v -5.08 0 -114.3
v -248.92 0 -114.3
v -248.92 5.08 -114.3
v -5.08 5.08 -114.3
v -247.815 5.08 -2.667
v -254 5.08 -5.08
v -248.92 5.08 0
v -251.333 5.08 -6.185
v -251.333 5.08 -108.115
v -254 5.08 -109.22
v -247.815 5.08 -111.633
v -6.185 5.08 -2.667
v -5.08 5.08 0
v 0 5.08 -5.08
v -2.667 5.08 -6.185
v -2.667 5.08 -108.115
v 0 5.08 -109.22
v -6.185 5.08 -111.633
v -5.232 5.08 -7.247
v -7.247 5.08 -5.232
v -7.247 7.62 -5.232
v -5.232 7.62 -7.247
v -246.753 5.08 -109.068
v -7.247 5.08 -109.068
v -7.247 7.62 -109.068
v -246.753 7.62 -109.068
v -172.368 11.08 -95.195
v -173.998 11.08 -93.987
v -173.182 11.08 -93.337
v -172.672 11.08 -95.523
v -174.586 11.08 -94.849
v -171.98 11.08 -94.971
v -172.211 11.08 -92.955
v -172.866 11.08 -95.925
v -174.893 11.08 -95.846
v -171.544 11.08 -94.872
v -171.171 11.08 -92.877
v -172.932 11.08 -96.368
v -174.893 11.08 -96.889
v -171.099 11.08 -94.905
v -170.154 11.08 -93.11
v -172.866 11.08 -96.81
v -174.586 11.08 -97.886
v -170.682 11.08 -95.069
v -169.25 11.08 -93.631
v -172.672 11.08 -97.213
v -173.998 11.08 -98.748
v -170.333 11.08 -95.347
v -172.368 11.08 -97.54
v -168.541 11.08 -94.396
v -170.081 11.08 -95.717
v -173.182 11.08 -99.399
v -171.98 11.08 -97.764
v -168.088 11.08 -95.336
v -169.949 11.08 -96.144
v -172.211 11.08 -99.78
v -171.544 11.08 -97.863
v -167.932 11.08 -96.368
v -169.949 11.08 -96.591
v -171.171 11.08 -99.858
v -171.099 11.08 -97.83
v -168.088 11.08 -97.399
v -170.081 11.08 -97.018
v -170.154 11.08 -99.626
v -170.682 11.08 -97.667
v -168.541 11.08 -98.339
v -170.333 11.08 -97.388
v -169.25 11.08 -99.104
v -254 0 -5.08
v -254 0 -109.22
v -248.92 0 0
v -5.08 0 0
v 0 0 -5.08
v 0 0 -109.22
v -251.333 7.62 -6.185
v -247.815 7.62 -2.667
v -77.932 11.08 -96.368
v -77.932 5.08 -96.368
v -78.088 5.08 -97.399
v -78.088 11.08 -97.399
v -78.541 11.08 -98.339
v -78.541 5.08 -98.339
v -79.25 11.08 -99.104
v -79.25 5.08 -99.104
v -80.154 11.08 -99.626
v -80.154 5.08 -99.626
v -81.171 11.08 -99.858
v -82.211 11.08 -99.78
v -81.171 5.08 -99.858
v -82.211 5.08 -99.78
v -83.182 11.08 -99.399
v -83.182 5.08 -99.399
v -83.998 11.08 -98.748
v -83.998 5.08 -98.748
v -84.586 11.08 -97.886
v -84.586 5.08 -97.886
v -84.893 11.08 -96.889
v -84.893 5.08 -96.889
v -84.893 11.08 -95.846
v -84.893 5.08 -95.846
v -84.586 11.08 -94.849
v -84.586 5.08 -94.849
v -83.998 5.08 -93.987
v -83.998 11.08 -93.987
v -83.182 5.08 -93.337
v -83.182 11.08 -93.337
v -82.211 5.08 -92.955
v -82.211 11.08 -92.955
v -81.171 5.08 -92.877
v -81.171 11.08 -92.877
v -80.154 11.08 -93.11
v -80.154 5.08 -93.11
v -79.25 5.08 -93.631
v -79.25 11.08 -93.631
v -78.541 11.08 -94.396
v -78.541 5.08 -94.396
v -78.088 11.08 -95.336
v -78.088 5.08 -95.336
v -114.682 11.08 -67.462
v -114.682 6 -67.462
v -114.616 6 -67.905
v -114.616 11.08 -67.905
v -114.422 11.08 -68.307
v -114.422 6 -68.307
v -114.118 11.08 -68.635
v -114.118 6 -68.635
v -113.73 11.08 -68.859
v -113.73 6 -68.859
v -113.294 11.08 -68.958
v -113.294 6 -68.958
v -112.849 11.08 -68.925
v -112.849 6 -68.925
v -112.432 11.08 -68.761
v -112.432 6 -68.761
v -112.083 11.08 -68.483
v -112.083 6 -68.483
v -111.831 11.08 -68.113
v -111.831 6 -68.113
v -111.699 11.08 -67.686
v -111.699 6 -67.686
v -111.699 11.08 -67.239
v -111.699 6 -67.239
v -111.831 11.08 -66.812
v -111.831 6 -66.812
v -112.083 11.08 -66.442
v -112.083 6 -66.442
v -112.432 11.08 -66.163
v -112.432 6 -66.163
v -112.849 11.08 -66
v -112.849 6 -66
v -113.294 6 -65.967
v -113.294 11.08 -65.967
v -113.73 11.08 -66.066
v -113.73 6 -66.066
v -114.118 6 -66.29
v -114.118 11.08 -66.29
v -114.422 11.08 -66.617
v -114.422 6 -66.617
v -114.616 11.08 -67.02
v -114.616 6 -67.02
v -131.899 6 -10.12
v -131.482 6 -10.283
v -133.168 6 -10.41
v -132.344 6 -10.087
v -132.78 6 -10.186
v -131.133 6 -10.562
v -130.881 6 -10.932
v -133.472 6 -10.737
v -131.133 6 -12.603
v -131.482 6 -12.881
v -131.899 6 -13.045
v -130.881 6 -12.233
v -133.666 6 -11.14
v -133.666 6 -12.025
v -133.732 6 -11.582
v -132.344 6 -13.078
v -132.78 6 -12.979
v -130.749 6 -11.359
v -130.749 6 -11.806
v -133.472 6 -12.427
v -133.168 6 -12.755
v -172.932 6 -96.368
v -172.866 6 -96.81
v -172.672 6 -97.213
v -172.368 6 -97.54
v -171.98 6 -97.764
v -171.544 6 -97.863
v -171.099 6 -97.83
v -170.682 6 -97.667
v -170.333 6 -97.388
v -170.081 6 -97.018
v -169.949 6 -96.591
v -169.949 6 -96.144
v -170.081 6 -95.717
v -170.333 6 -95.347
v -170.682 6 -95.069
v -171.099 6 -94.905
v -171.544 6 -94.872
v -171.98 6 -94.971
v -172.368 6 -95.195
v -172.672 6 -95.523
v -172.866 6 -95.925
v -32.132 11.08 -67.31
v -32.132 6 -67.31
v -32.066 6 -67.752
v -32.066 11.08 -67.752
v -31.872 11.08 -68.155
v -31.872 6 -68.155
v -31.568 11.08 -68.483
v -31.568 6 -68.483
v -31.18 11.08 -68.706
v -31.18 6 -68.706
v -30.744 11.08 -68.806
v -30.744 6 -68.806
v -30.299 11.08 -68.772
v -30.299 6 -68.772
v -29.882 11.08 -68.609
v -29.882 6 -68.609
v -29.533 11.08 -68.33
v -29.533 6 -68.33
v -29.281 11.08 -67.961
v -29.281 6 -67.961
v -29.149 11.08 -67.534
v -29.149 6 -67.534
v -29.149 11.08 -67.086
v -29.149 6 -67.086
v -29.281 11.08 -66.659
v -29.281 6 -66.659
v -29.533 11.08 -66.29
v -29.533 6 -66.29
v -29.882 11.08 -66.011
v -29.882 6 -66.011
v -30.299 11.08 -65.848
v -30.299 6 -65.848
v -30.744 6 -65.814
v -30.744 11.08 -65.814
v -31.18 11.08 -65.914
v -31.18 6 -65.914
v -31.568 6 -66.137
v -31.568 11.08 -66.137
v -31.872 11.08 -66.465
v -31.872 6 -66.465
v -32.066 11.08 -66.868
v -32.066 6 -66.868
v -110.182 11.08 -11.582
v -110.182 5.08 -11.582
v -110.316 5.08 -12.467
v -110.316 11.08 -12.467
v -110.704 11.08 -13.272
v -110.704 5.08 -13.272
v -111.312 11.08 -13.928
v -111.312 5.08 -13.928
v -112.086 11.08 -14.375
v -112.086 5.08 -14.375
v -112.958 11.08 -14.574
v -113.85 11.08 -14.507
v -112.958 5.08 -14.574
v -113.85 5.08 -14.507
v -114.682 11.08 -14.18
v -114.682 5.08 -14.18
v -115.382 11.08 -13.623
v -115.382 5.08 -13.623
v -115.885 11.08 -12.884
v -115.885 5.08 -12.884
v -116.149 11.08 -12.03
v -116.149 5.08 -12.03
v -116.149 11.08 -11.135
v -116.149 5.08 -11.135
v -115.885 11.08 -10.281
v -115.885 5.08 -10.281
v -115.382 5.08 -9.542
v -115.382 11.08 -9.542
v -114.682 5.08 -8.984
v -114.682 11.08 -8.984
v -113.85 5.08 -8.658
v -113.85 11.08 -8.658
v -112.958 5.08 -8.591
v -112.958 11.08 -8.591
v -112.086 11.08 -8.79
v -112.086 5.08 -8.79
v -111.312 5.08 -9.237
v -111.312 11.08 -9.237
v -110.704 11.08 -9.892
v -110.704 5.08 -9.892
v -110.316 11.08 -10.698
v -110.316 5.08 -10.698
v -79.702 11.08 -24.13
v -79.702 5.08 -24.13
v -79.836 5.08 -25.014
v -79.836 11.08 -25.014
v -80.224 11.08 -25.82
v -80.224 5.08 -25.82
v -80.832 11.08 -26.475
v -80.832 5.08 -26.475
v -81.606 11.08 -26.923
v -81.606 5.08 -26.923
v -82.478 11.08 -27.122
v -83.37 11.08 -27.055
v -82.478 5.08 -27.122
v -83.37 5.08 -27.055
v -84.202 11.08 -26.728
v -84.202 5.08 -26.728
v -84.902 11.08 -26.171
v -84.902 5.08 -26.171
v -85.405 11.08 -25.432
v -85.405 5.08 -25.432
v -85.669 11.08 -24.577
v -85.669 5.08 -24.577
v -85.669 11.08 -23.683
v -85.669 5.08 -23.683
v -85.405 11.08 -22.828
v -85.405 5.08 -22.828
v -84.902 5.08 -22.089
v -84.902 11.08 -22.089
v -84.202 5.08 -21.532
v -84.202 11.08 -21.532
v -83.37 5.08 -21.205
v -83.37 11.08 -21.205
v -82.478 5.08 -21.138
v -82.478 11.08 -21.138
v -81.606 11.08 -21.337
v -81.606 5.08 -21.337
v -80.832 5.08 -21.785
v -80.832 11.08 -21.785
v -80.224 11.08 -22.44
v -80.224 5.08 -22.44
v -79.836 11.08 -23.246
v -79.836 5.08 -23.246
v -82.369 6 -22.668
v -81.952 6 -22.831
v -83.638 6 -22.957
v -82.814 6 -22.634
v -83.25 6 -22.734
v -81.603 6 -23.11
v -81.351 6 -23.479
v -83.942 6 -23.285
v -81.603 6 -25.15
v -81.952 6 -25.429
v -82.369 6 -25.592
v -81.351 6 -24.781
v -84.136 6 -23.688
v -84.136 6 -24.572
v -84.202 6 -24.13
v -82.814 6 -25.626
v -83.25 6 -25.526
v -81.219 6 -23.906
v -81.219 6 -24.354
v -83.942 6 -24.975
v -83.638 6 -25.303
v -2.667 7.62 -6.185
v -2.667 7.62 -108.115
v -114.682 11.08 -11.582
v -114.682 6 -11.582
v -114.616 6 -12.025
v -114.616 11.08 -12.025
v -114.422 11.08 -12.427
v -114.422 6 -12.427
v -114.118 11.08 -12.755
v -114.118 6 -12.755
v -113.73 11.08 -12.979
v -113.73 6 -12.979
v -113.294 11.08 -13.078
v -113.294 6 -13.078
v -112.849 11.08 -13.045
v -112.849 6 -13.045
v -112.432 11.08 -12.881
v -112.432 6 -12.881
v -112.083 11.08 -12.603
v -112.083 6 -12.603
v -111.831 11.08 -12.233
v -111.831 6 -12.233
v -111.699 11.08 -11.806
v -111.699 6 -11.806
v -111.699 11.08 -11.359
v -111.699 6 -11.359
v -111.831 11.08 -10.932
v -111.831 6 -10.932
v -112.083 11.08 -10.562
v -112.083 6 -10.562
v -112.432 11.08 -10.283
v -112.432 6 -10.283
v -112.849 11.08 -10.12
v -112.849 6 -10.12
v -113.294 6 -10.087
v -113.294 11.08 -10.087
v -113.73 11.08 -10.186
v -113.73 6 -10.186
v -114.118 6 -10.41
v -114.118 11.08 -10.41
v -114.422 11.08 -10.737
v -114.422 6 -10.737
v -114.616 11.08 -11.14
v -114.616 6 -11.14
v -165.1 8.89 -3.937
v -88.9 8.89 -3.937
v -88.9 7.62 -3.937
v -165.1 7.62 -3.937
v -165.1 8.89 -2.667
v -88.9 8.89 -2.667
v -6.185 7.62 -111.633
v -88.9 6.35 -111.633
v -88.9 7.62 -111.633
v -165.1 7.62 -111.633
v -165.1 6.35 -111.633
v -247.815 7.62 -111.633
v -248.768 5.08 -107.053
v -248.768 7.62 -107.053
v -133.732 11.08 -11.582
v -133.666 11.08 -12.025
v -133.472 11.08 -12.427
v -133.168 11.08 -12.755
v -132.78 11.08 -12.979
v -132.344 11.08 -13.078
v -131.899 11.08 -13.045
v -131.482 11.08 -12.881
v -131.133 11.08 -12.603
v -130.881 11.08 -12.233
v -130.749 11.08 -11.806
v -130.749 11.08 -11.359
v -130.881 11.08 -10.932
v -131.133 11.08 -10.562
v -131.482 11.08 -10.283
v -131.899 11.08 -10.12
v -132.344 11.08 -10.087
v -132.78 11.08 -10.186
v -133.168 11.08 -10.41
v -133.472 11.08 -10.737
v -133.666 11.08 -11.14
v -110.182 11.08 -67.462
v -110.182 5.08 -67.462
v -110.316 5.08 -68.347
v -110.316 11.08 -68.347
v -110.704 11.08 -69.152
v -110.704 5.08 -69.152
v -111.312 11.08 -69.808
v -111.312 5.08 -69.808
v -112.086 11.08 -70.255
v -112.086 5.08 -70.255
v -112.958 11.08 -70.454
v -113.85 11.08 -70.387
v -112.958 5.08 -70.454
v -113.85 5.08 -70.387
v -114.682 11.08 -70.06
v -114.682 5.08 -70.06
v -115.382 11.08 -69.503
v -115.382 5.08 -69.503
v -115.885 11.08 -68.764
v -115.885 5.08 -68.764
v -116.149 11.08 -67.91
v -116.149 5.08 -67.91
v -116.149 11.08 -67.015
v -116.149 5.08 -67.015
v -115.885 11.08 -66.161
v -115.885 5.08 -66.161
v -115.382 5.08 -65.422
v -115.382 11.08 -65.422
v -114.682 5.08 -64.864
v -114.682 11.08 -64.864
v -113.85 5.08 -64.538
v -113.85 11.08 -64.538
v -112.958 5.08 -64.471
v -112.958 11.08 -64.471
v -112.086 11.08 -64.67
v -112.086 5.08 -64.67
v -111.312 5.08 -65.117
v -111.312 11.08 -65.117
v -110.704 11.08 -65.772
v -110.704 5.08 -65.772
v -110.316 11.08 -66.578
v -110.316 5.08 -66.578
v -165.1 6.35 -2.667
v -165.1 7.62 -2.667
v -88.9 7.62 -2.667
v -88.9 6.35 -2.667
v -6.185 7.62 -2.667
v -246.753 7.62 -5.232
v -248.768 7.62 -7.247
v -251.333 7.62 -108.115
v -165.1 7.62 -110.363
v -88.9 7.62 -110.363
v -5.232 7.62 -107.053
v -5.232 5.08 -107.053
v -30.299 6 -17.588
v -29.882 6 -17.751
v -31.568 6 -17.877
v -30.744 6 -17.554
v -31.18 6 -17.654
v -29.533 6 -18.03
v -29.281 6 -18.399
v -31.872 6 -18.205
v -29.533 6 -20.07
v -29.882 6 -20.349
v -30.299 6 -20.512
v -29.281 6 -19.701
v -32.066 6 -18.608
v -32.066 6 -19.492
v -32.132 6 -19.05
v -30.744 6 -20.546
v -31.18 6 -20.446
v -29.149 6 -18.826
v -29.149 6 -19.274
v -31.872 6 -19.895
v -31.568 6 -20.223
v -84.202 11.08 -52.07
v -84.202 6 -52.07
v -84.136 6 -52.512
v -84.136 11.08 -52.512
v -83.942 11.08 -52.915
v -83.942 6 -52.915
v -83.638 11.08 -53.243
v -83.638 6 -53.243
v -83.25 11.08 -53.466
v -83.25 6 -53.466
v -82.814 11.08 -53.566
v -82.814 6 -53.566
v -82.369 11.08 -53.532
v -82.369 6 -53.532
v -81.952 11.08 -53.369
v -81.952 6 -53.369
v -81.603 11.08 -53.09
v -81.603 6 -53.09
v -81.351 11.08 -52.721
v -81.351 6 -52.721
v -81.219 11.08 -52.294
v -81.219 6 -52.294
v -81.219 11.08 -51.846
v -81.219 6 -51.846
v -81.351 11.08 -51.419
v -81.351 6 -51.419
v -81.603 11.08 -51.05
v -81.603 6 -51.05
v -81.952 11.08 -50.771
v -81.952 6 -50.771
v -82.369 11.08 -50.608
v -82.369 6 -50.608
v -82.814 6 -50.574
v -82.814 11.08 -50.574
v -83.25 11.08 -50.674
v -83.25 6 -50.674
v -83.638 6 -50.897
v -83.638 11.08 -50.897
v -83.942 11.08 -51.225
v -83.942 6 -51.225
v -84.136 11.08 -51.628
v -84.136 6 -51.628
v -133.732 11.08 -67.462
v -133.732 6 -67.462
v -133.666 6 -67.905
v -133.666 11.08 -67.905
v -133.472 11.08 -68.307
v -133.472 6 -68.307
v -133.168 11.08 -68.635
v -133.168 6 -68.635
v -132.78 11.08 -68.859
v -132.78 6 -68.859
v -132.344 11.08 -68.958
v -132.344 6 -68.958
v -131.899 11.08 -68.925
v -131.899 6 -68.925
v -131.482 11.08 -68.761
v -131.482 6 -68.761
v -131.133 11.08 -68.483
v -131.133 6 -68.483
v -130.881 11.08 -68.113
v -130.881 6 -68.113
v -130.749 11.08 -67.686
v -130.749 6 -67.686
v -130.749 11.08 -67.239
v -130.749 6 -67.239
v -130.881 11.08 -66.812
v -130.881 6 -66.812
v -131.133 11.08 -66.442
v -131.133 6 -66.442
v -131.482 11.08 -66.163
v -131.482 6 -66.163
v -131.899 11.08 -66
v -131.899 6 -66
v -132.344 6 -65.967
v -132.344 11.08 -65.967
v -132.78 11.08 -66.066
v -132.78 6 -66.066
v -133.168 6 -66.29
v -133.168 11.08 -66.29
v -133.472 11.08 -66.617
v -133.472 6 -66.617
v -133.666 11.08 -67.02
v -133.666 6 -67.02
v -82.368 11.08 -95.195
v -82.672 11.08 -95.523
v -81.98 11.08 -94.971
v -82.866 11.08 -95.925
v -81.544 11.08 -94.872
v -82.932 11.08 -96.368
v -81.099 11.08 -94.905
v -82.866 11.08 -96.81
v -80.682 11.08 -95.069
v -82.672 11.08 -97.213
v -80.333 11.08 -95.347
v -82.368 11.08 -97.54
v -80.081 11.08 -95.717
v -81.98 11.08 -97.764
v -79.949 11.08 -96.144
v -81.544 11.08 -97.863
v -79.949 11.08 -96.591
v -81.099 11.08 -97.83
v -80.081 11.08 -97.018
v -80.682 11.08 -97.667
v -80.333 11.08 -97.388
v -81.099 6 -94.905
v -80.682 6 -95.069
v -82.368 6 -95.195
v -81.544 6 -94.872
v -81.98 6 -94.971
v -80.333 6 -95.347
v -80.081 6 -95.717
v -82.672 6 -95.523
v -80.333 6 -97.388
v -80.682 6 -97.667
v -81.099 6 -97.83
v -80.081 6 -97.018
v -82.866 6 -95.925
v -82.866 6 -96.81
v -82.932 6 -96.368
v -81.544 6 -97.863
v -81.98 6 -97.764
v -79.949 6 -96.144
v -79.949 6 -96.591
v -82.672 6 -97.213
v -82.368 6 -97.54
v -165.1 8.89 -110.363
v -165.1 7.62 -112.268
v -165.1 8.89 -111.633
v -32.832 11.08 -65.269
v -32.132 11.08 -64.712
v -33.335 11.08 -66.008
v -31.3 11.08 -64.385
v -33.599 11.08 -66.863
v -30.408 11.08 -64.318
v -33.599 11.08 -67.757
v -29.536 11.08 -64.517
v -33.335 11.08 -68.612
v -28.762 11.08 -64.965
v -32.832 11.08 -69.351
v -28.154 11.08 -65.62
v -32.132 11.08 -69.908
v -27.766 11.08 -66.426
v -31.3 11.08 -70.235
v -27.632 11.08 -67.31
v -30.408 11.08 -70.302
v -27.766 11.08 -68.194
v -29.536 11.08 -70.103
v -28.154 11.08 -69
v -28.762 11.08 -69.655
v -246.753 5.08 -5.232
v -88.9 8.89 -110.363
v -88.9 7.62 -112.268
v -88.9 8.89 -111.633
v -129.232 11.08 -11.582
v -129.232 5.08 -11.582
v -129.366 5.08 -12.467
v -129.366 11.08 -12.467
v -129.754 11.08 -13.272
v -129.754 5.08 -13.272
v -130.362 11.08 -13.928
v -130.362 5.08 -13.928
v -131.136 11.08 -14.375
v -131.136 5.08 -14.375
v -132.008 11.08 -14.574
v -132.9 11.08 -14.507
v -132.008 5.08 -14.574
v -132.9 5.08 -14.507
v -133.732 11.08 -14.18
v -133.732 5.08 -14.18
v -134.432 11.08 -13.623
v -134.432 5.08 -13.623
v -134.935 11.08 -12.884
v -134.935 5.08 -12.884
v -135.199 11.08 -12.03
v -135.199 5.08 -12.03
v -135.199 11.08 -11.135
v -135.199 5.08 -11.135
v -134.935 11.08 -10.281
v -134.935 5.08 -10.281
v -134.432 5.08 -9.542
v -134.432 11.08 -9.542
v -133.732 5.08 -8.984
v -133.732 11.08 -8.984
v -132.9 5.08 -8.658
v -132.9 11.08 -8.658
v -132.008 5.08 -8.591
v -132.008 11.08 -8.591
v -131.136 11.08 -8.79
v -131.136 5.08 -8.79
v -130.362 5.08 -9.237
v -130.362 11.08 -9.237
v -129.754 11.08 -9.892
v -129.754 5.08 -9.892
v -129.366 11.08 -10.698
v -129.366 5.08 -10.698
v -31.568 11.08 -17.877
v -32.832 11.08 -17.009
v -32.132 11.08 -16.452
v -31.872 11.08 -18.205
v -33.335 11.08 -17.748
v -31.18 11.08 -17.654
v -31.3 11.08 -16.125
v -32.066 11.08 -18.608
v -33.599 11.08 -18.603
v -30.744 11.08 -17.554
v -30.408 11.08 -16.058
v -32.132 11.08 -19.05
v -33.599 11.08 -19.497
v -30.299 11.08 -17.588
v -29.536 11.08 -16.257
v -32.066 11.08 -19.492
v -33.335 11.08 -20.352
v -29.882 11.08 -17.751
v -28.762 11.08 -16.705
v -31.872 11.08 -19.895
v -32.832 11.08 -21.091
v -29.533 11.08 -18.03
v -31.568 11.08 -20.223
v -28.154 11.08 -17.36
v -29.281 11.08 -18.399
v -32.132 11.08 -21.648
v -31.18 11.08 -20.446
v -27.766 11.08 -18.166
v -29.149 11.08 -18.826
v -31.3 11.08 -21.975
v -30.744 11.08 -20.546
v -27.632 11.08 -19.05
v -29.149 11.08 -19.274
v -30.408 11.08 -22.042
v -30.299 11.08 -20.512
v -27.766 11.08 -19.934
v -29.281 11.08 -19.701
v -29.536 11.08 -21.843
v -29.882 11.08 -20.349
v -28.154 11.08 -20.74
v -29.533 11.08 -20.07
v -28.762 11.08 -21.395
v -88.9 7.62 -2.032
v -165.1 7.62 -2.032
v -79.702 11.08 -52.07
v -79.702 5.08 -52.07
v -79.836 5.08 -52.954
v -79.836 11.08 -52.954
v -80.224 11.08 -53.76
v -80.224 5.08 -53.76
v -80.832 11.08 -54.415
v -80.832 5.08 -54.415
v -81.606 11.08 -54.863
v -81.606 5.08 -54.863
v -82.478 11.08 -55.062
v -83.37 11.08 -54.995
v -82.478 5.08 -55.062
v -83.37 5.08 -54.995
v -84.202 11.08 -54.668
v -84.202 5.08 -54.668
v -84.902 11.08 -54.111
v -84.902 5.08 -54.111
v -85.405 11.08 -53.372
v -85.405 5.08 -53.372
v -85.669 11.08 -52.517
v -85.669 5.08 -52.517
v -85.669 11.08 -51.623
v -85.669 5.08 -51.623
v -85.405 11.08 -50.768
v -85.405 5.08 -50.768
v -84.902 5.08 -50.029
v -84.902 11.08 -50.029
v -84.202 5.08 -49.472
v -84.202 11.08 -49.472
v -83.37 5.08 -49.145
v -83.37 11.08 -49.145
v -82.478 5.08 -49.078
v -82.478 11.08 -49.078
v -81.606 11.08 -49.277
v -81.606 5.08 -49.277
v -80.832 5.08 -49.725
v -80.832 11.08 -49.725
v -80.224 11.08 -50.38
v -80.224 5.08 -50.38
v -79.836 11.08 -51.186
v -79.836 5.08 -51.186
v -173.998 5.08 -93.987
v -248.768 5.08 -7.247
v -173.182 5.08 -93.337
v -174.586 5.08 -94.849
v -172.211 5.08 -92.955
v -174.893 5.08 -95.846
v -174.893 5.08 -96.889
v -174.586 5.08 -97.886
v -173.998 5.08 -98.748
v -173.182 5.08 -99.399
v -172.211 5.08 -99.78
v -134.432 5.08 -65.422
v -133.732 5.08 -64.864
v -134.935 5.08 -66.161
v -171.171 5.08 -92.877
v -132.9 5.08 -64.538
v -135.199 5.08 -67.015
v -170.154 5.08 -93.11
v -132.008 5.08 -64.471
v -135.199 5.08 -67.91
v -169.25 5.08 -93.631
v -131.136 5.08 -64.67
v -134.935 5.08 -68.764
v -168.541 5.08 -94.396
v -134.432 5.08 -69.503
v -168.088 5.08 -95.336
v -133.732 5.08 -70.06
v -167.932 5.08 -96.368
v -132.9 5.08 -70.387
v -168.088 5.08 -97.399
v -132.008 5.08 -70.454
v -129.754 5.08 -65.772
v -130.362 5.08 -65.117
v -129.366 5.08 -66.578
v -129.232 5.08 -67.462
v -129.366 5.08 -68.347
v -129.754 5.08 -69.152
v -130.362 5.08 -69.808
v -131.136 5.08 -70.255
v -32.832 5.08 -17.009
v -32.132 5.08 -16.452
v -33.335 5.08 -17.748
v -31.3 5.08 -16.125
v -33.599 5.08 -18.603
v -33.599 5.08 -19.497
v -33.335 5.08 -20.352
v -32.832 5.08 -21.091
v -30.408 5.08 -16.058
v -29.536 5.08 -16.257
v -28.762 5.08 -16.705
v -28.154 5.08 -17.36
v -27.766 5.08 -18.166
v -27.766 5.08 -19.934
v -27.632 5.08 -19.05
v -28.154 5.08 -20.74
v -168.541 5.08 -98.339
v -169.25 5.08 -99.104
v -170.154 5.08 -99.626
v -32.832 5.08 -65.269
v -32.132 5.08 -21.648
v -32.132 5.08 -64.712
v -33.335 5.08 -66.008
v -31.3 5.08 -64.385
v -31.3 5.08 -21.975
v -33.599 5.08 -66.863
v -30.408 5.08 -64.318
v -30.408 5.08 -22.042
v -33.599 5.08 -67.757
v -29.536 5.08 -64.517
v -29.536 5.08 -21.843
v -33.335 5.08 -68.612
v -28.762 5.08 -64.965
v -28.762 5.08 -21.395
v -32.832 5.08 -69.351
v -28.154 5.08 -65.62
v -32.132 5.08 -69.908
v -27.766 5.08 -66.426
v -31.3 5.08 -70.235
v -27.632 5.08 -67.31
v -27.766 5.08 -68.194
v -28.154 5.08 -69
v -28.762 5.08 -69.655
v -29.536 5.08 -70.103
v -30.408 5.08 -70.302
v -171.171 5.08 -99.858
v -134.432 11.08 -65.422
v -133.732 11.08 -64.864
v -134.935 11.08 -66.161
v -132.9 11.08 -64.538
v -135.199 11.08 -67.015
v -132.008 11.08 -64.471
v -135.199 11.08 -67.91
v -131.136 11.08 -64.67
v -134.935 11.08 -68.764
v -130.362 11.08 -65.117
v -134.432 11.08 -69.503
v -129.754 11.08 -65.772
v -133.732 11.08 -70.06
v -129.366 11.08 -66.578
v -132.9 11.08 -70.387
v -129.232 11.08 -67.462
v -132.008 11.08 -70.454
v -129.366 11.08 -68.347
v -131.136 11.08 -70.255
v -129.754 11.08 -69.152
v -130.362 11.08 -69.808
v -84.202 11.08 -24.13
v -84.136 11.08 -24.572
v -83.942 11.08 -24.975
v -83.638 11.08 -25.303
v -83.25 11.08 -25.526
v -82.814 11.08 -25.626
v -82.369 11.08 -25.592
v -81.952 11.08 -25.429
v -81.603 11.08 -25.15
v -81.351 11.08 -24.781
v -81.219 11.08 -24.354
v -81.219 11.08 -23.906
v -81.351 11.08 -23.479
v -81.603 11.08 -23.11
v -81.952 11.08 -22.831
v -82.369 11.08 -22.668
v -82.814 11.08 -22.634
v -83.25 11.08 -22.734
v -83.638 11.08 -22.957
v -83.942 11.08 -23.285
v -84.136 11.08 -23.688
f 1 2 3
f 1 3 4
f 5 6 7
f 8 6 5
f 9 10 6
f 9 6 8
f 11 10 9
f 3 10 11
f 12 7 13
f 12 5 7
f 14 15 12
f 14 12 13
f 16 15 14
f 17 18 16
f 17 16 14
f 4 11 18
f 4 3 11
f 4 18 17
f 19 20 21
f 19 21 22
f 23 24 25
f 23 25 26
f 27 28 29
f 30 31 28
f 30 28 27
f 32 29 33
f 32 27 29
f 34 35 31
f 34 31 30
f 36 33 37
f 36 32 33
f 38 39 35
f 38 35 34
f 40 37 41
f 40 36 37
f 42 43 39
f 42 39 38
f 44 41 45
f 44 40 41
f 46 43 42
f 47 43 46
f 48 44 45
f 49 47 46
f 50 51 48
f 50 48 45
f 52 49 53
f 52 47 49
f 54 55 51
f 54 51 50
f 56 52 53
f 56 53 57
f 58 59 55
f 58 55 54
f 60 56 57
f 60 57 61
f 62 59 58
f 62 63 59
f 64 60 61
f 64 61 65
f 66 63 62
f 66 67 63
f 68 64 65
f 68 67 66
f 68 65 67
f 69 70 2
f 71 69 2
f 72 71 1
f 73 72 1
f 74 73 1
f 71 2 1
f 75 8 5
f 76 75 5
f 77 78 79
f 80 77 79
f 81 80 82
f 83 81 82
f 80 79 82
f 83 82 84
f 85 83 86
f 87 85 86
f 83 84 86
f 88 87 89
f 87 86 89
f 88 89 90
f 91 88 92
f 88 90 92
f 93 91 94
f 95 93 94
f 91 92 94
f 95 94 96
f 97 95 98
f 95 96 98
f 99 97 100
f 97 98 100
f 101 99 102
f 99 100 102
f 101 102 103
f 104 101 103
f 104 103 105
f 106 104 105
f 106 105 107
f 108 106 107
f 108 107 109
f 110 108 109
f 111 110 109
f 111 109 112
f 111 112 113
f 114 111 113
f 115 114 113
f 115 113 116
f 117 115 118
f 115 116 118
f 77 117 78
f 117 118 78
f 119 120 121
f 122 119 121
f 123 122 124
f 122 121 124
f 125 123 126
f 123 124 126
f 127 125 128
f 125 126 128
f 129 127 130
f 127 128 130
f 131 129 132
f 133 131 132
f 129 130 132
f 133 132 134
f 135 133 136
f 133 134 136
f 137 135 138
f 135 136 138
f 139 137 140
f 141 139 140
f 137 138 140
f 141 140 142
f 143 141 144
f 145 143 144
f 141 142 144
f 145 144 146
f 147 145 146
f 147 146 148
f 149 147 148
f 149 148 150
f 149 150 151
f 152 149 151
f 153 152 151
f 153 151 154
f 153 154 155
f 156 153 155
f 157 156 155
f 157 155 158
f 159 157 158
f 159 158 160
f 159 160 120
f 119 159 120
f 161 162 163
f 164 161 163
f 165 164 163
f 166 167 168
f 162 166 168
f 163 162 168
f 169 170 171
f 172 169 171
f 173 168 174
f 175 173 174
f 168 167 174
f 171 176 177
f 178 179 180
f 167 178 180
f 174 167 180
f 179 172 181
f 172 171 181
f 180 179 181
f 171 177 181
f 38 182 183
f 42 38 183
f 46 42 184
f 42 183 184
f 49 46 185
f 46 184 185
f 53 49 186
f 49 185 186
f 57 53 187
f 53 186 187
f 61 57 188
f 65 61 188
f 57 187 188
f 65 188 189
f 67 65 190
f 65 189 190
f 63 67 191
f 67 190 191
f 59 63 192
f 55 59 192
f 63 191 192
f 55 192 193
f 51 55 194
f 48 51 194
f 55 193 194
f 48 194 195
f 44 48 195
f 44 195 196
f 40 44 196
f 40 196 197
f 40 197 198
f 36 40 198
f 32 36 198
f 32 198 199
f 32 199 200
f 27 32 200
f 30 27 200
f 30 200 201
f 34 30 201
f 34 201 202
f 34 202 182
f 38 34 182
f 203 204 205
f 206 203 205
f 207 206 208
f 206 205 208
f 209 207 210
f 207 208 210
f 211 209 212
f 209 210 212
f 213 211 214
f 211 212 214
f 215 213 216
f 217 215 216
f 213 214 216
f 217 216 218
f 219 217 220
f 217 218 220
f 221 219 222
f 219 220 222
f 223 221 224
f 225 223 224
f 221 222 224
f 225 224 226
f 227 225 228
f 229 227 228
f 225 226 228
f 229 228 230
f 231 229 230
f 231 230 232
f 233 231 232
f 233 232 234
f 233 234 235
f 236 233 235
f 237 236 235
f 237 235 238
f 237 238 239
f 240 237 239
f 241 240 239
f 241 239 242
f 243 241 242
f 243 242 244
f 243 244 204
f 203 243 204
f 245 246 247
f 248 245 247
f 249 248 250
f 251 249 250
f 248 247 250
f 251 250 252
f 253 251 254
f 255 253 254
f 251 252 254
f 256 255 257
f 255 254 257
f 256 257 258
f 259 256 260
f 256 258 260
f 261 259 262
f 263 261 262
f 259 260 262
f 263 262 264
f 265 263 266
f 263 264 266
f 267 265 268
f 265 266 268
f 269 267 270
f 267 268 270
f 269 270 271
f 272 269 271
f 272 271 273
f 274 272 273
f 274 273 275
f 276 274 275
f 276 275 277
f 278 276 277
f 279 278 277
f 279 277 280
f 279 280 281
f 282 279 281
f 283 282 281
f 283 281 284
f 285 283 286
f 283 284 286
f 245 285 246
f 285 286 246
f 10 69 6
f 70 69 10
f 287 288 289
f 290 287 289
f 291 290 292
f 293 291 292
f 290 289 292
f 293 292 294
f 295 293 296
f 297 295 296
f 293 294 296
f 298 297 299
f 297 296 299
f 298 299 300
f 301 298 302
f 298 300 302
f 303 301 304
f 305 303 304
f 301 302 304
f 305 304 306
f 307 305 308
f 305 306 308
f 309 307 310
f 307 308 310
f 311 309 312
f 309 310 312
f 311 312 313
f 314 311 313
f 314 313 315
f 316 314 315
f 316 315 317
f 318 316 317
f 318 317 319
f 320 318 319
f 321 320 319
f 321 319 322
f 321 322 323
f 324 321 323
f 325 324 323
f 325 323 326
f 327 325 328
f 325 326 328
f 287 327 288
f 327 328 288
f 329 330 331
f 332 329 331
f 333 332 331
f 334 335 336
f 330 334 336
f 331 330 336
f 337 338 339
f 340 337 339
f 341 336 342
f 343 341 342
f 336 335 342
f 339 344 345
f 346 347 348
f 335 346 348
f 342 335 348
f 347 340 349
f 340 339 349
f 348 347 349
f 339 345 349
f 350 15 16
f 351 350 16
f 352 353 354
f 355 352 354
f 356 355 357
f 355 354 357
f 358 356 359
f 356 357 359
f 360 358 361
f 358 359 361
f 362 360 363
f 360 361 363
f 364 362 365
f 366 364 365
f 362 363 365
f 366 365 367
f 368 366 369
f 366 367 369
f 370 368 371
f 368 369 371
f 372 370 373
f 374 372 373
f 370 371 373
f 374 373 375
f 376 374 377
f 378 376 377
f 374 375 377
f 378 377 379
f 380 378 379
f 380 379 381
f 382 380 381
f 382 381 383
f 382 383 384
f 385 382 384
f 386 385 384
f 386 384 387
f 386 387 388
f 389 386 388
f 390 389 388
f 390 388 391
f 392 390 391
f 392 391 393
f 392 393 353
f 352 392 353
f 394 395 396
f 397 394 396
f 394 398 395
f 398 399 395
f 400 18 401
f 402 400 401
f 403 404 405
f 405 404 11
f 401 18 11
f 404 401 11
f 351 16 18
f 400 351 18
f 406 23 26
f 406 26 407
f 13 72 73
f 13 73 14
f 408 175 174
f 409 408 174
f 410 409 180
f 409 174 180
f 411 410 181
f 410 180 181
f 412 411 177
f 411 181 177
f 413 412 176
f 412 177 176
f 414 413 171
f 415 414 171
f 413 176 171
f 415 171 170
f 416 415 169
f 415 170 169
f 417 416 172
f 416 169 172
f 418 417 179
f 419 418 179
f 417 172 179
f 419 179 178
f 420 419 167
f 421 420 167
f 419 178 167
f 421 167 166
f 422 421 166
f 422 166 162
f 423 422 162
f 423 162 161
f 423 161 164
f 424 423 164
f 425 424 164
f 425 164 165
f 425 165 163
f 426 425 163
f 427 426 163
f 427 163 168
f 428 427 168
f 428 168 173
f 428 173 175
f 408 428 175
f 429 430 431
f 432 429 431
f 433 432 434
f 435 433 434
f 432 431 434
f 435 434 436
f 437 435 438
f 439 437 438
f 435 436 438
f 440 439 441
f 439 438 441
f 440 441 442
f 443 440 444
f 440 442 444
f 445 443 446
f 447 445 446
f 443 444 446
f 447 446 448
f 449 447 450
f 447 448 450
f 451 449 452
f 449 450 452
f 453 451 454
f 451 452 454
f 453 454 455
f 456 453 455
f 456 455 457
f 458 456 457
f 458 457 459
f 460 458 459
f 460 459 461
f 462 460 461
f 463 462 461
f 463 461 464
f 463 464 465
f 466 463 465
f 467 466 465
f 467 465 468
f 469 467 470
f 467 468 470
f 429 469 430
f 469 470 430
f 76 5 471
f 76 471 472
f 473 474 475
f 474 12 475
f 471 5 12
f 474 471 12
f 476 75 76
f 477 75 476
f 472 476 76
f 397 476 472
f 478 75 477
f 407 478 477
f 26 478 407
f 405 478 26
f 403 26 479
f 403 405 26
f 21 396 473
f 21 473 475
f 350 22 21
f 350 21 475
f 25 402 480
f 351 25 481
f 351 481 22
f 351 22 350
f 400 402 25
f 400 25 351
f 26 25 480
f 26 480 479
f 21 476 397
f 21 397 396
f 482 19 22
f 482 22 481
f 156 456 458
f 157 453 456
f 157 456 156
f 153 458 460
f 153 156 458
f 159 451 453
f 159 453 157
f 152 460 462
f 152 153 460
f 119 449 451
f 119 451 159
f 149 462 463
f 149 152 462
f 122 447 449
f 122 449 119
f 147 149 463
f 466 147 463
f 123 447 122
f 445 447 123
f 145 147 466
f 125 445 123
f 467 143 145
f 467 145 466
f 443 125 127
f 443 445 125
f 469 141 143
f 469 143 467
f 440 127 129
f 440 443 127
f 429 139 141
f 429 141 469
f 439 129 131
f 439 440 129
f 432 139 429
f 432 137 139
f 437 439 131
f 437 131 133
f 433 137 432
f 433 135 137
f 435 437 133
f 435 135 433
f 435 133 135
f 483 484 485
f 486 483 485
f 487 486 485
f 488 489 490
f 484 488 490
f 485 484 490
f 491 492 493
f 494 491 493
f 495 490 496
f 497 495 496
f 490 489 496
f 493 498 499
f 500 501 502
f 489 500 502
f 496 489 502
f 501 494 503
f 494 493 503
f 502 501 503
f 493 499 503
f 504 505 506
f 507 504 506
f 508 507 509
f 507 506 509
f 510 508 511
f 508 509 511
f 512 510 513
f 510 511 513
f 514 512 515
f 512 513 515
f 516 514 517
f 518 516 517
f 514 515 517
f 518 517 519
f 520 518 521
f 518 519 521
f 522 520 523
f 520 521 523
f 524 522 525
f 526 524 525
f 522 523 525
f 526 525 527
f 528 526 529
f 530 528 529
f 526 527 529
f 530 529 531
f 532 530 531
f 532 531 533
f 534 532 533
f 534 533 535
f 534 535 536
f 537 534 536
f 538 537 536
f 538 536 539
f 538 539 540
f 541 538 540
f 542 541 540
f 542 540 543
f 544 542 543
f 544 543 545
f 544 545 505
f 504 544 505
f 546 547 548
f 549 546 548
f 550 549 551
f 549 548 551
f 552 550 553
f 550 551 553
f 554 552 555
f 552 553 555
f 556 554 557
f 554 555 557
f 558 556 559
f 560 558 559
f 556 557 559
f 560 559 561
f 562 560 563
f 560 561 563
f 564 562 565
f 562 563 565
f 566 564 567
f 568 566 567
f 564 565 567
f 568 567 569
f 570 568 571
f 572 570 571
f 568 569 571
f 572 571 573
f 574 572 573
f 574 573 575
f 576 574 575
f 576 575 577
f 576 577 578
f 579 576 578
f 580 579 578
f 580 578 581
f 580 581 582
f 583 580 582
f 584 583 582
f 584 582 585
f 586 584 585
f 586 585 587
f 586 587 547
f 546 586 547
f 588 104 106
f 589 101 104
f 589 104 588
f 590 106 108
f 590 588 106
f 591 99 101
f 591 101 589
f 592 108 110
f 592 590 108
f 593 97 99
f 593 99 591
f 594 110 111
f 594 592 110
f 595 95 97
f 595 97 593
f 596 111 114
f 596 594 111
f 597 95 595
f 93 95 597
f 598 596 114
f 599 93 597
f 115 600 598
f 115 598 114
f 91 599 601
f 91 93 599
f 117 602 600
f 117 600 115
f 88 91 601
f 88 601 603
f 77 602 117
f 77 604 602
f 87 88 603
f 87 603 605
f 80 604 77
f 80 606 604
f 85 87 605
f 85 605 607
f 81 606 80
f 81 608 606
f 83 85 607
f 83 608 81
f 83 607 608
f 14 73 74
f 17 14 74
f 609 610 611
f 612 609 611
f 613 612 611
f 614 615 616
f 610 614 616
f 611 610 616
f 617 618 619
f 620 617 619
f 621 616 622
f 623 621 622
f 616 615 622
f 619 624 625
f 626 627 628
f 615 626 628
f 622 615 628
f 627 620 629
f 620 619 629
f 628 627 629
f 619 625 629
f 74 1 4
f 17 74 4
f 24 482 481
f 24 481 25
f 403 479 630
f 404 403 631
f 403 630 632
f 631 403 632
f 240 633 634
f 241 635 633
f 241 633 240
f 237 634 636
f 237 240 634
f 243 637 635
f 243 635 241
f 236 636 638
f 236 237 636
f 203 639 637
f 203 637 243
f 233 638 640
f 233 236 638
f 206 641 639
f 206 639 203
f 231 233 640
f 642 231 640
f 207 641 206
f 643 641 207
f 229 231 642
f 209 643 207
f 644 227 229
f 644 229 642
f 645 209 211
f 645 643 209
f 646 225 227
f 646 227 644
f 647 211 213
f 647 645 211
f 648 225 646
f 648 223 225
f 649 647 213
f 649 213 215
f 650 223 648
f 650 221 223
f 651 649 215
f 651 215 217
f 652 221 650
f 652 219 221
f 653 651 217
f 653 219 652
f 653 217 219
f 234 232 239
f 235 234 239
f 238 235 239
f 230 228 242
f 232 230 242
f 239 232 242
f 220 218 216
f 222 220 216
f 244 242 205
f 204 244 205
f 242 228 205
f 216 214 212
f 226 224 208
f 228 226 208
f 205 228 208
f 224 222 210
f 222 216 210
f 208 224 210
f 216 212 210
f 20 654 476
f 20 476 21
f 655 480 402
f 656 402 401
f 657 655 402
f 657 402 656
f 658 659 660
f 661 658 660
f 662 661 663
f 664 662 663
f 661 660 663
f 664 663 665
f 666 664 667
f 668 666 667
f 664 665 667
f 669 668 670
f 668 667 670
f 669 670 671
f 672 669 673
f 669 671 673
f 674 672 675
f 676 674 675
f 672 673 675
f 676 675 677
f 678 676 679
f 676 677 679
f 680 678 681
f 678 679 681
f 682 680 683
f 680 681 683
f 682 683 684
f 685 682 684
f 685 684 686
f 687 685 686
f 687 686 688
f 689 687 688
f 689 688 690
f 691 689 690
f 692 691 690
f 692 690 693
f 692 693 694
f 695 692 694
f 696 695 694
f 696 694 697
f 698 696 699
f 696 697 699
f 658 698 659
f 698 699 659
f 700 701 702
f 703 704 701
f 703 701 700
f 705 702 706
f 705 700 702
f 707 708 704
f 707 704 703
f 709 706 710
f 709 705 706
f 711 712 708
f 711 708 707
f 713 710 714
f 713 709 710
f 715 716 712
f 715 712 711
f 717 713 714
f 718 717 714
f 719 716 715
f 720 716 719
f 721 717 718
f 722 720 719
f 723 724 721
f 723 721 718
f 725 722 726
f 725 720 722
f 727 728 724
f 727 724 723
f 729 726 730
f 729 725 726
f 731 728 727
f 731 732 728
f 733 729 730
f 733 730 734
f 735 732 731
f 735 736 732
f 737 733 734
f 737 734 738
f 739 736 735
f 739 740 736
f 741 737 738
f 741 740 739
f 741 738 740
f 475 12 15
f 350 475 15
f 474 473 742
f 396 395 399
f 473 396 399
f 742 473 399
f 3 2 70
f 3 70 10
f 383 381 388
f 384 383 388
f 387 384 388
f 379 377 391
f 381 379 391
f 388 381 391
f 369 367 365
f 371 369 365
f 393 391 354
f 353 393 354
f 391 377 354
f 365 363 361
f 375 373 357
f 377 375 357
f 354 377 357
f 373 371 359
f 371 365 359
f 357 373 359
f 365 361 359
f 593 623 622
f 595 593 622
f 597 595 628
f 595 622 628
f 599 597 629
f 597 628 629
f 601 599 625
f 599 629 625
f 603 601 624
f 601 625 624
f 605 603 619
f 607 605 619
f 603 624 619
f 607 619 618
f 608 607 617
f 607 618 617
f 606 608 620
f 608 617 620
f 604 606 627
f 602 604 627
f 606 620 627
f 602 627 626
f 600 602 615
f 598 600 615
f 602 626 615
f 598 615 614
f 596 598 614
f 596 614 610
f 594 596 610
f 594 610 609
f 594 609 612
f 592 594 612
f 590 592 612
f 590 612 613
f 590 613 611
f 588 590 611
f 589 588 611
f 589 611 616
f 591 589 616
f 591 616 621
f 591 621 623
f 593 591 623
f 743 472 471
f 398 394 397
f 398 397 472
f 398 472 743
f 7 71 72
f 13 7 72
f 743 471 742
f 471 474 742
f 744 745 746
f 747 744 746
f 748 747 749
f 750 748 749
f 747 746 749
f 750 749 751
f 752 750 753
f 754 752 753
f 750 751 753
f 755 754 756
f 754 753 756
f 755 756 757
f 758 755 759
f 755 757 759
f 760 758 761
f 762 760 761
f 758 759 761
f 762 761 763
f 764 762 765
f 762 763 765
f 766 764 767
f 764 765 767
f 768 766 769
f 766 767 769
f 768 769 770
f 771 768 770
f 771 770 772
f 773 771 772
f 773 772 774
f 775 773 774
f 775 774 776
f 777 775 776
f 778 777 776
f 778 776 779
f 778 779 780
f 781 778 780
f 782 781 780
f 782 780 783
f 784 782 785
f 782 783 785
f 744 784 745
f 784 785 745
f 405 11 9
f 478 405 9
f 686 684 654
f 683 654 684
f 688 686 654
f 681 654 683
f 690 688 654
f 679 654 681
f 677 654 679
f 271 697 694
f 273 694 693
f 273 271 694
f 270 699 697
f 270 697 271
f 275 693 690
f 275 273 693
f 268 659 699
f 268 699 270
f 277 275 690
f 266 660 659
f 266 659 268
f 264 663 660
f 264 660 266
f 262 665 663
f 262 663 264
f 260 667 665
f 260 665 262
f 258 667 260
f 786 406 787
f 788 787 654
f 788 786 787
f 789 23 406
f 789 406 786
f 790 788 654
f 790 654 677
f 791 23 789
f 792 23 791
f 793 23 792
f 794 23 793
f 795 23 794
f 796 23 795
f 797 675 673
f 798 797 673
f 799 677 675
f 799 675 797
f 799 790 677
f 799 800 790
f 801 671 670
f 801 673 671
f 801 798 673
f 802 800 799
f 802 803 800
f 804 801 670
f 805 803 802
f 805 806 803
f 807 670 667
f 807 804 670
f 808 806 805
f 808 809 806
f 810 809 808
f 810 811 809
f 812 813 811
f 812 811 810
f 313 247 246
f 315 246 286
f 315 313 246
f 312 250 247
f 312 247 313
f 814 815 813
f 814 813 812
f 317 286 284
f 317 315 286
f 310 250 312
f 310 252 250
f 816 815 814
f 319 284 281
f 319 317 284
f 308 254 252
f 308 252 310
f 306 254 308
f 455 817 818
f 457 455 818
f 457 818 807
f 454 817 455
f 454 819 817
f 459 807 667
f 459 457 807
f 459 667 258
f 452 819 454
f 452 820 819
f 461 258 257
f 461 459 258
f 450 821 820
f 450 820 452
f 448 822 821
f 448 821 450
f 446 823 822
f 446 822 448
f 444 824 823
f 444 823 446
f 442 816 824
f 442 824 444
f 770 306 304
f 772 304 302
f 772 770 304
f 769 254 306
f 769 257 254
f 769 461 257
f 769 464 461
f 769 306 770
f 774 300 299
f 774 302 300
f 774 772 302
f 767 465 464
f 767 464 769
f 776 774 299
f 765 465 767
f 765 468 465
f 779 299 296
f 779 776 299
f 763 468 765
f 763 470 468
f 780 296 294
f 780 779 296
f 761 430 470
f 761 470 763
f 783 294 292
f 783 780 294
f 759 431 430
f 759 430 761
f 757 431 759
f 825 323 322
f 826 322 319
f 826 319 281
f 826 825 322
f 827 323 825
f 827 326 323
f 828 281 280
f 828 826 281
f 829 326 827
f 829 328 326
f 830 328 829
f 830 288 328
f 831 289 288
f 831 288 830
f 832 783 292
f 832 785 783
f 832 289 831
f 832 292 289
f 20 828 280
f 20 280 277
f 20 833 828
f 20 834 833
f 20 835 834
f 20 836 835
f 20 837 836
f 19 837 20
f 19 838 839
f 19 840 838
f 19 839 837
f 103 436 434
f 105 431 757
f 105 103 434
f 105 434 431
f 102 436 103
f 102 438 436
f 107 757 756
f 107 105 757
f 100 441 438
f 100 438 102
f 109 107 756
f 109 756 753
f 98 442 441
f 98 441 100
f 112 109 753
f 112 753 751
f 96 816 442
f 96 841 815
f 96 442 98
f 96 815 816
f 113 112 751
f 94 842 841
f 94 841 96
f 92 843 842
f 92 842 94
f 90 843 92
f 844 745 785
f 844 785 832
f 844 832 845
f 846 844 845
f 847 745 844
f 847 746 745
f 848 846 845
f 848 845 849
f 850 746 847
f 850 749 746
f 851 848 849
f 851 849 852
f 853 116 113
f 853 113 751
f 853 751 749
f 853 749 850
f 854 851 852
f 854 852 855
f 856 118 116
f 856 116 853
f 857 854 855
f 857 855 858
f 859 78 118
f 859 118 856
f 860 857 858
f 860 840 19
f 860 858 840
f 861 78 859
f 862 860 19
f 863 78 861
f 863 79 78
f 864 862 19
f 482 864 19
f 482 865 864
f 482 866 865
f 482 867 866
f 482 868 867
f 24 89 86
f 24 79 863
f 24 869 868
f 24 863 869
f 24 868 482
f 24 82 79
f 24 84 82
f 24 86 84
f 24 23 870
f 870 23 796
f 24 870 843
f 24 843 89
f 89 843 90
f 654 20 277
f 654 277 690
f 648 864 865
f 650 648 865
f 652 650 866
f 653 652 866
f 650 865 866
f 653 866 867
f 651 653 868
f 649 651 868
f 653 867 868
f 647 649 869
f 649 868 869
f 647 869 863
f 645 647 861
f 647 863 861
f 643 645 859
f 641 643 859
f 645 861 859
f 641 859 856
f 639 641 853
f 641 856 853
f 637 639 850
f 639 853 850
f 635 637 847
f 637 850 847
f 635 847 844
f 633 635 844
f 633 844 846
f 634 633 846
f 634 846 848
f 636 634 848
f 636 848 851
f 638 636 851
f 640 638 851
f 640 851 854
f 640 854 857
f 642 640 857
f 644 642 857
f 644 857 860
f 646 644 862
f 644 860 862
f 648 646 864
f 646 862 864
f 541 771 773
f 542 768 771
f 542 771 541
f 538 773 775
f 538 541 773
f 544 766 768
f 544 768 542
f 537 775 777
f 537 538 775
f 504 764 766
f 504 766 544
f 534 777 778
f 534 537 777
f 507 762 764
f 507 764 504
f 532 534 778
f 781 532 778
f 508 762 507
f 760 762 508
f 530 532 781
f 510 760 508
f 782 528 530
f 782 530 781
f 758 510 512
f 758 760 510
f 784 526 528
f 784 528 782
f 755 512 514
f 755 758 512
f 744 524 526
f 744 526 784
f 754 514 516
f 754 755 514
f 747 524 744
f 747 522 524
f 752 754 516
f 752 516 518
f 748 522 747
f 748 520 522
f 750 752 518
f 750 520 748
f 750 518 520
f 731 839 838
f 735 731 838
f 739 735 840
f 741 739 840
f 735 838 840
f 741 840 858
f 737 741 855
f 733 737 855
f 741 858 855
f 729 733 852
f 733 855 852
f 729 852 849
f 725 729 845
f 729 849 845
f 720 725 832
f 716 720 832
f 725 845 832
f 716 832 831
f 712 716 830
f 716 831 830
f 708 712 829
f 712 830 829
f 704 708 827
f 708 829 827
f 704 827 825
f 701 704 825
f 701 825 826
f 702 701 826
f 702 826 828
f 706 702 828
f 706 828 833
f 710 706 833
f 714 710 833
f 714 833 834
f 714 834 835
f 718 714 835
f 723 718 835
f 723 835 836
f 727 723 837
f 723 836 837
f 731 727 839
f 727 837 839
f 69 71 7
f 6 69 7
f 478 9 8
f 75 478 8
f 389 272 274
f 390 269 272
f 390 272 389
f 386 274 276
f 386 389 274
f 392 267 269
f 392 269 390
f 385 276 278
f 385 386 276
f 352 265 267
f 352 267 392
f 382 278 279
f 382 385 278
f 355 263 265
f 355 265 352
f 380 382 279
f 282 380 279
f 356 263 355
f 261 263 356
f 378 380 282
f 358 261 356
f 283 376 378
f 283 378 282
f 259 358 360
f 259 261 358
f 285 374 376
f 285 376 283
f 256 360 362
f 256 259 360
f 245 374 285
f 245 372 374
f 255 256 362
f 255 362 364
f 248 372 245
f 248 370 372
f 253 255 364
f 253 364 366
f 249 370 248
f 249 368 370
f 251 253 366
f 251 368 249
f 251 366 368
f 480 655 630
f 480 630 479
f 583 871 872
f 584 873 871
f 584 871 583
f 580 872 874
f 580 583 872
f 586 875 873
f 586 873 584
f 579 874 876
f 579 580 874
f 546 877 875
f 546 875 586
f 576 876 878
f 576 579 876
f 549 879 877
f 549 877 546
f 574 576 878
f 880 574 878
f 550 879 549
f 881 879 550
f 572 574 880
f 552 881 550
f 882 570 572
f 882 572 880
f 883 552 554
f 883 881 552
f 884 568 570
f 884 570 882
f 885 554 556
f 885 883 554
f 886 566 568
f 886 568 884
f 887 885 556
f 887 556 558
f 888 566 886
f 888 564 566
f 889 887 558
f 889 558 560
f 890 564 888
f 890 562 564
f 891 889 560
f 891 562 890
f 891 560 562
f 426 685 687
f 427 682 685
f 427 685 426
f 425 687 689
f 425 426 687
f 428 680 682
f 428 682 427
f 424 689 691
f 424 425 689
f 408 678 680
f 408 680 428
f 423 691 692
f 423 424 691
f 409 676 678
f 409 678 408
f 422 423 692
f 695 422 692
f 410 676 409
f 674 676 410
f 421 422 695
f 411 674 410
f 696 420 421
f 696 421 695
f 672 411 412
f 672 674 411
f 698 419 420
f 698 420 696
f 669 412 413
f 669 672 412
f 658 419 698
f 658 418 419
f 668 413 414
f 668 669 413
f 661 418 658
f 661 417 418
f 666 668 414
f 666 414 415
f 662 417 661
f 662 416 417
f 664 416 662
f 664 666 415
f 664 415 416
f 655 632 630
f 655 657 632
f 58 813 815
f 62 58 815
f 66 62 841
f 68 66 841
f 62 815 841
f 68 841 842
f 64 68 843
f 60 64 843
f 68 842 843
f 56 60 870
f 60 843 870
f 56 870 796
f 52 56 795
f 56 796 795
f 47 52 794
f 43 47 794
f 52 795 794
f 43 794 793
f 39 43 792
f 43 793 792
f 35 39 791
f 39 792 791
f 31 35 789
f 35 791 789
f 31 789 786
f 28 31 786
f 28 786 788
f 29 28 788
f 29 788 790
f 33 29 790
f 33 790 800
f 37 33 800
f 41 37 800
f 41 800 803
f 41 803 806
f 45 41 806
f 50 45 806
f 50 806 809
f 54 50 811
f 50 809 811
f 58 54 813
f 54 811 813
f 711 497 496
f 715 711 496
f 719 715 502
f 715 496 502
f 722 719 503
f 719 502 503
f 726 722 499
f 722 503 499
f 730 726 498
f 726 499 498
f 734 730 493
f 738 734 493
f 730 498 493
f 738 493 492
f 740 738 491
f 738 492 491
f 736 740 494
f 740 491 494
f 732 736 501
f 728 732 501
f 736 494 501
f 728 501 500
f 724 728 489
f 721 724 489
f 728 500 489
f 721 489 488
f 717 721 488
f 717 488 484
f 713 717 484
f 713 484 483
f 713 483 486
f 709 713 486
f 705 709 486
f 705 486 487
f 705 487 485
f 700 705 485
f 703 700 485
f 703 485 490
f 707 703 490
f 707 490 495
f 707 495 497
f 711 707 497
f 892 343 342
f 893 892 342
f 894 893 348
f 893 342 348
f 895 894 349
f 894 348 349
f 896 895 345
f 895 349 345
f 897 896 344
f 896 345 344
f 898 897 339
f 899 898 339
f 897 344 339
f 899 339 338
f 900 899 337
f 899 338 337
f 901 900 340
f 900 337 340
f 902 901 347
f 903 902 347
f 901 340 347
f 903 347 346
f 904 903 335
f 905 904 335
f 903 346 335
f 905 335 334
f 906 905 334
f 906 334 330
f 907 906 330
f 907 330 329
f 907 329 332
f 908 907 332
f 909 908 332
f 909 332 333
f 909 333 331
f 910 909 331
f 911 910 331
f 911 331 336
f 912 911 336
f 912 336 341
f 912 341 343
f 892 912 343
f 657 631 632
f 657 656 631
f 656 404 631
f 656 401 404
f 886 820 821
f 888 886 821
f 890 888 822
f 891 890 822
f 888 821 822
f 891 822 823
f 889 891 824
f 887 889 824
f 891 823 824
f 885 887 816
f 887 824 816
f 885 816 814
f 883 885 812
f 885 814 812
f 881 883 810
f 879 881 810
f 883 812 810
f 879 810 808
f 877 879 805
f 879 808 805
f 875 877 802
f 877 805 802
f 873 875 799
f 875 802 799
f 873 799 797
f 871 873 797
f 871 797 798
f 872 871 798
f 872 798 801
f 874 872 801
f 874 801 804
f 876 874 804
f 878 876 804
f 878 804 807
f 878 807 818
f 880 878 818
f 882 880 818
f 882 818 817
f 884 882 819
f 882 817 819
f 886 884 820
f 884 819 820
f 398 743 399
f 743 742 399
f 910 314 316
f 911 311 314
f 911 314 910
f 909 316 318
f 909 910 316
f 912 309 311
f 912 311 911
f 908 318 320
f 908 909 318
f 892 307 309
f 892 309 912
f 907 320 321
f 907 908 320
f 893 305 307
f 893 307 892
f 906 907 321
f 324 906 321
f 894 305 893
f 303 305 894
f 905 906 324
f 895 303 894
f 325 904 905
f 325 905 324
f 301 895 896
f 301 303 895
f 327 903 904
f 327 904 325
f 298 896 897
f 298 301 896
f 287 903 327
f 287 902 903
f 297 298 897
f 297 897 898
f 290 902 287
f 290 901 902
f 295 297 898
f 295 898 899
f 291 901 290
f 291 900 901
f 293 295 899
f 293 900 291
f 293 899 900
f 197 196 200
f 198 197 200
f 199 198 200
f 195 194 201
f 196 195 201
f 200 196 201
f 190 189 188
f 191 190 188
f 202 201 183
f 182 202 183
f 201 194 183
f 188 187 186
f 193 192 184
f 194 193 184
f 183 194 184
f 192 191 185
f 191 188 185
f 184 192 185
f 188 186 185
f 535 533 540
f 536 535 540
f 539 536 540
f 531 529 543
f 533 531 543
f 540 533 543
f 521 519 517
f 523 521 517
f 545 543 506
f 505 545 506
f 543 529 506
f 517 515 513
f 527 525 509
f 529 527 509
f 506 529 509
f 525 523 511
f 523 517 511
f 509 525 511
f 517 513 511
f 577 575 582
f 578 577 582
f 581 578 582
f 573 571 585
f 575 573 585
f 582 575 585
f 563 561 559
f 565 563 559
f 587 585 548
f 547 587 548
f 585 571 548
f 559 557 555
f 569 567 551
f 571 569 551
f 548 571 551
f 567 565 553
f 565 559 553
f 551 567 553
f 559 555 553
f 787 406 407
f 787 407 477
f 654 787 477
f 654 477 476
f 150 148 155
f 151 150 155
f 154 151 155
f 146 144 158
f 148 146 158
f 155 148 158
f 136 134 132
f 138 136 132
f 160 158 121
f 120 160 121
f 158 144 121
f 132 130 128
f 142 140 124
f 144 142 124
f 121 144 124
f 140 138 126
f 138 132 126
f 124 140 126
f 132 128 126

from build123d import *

# Parameters (mm, degrees)
SKETCH1_W                 = 254
SKETCH1_H                 = 114.3
BOSS_EXTRUDE1_DEPTH       = 5.08
CHAMFER1_SIZE             = 5.08
BOSS_EXTRUDE3_START       = -127
BOSS_EXTRUDE3_DEPTH       = 38.1
BOSS_EXTRUDE4_DEPTH       = 2.54
SKETCH6_R                 = 3
BOSS_EXTRUDE5_DEPTH       = 6
SKETCH12_R                = 3
SKETCH12_R_2              = 3.5
BOSS_EXTRUDE7_DEPTH       = 6
F_3_0MM_DOWEL_HOLE1_D     = 3
F_3_0MM_DOWEL_HOLE1_DEPTH = 5.08


with BuildPart() as part:
    # Sketch1 → Boss-Extrude1 (new body)
    with BuildSketch(Plane(origin=(0, 0, 0), x_dir=(1, 0, 0), z_dir=(0, 1, 0))):
        with Locations((-127, 57.15)):
            Rectangle(SKETCH1_W, SKETCH1_H)
    extrude(amount=BOSS_EXTRUDE1_DEPTH)

    # Chamfer1
    chamfer1_edges = [part.edges().sort_by_distance(p)[0] for p in [
        (0, 2.54, 0),
        (-254, 2.54, 0),
        (-254, 2.54, -114.3),
        (0, 2.54, -114.3),
    ]]
    chamfer(chamfer1_edges, length=CHAMFER1_SIZE)

    # Sketch3 → Boss-Extrude3 (add, symmetric)
    with BuildSketch(Plane(origin=(0, 0, 0), x_dir=(0, 0, -1), z_dir=(1, 0, 0)).offset(BOSS_EXTRUDE3_START)):
        Polygon((2.667, 5.08), (2.667, 6.35), (2.032, 7.62), (2.667, 8.89), (3.937, 8.89), (3.937, 5.08), align=None)
    boss_extrude3 = extrude(amount=BOSS_EXTRUDE3_DEPTH, both=True)

    # Mirror1: Boss-Extrude3 across plane
    add(boss_extrude3.mirror(Plane.XY.offset(-57.15)))

    # Sketch4 → Boss-Extrude4 (add)
    with BuildSketch(Plane(origin=(0, 5.08, 0), x_dir=(1, 0, 0), z_dir=(0, 1, 0))):
        Polygon((-6.184707571, 111.633), (-247.815292429, 111.633), (-251.333, 108.115292429), (-251.333, 6.184707571), (-247.815292429, 2.667), (-6.184707571, 2.667), (-2.667, 6.184707571), (-2.667, 108.115292429), align=None)
        Polygon((-7.247331044, 109.0676), (-246.752668956, 109.0676), (-248.7676, 107.052668956), (-248.7676, 7.247331044), (-246.752668956, 5.2324), (-7.247331044, 5.2324), (-5.2324, 7.247331044), (-5.2324, 107.052668956), align=None, mode=Mode.SUBTRACT)
    extrude(amount=BOSS_EXTRUDE4_DEPTH)

    # Sketch6 → Boss-Extrude5 (add)
    with BuildSketch(Plane(origin=(0, 5.08, 0), x_dir=(1, 0, 0), z_dir=(0, 1, 0))):
        with Locations((-30.6324, 67.31)):
            Circle(SKETCH6_R)
        with Locations((-30.6324, 19.05)):
            Circle(SKETCH6_R)
        with Locations((-82.7024, 52.07)):
            Circle(SKETCH6_R)
        with Locations((-82.7024, 24.13)):
            Circle(SKETCH6_R)
    extrude(amount=BOSS_EXTRUDE5_DEPTH)

    # Sketch12 → Boss-Extrude7 (add)
    with BuildSketch(Plane(origin=(0, 5.08, 0), x_dir=(1, 0, 0), z_dir=(0, 1, 0))):
        with Locations((-132.2324, 67.4624)):
            Circle(SKETCH12_R)
        with Locations((-132.2324, 11.5824)):
            Circle(SKETCH12_R)
        with Locations((-113.1824, 67.4624)):
            Circle(SKETCH12_R)
        with Locations((-113.1824, 11.5824)):
            Circle(SKETCH12_R)
        with Locations((-81.4324, 96.3676)):
            Circle(SKETCH12_R_2)
        with Locations((-171.4324, 96.3676)):
            Circle(SKETCH12_R_2)
    extrude(amount=BOSS_EXTRUDE7_DEPTH)

    # Ø3.0mm Dowel Hole1
    with Locations(Plane(origin=(0, 11.08, 0), x_dir=(1, 0, 0), z_dir=(0, 1, 0))):
        with Locations((-82.7024, 24.13), (-82.7024, 52.07), (-30.6324, 67.31), (-30.6324, 19.05), (-132.2324, 11.5824), (-113.1824, 11.5824), (-171.4324, 96.3676), (-132.2324, 67.4624), (-113.1824, 67.4624), (-81.4324, 96.3676)):
            Hole(F_3_0MM_DOWEL_HOLE1_D / 2, depth=F_3_0MM_DOWEL_HOLE1_DEPTH)


solid = part.part
